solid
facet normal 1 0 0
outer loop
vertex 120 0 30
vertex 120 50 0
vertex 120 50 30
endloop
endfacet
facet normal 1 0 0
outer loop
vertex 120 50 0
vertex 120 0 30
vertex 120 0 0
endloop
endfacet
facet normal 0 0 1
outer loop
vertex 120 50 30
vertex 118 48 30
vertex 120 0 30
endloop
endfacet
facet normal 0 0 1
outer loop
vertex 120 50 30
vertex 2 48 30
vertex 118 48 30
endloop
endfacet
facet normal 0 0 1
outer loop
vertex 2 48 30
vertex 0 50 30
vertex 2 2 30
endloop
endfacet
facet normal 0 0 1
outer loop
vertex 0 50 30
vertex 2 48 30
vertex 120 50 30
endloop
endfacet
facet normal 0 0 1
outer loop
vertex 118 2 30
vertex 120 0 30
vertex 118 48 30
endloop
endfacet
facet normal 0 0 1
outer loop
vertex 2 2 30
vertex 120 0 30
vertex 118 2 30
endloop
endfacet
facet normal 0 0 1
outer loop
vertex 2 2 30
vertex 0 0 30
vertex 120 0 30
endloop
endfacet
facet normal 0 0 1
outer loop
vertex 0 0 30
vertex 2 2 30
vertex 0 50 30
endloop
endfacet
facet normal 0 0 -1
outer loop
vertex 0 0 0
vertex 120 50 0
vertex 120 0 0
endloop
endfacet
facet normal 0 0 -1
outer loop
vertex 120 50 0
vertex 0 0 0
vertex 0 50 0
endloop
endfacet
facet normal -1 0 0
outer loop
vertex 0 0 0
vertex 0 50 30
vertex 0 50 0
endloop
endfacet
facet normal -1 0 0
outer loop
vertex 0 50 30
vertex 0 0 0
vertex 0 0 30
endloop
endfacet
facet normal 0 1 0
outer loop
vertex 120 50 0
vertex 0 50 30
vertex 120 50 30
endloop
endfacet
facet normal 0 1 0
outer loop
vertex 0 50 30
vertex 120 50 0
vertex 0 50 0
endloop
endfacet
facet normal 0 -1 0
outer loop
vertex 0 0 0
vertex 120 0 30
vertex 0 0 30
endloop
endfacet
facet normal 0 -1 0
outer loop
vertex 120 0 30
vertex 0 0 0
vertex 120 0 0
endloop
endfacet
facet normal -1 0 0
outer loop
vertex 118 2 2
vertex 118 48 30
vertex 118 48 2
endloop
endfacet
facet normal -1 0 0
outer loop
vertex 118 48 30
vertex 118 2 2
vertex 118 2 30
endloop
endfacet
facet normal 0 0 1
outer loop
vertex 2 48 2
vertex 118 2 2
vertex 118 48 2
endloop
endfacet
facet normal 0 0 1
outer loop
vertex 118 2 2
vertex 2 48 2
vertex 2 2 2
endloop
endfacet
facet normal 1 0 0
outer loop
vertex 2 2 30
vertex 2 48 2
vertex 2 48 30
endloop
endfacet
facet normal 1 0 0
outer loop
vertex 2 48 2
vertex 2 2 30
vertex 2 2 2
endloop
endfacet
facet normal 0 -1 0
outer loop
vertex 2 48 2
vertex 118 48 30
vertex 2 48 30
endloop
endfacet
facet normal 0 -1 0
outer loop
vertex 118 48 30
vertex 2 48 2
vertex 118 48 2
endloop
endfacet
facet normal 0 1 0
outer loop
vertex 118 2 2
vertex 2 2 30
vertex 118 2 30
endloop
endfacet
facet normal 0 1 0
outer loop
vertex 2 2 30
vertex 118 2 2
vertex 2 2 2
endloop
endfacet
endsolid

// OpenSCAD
Length = 120;
Width = 50;
Height = 30;
Wall = 2;

difference() {
    cube([Length, Width, Height]);
    translate([Wall, Wall, Wall])
        cube([Length-2*Wall,Width-2*Wall,Height]);
}
